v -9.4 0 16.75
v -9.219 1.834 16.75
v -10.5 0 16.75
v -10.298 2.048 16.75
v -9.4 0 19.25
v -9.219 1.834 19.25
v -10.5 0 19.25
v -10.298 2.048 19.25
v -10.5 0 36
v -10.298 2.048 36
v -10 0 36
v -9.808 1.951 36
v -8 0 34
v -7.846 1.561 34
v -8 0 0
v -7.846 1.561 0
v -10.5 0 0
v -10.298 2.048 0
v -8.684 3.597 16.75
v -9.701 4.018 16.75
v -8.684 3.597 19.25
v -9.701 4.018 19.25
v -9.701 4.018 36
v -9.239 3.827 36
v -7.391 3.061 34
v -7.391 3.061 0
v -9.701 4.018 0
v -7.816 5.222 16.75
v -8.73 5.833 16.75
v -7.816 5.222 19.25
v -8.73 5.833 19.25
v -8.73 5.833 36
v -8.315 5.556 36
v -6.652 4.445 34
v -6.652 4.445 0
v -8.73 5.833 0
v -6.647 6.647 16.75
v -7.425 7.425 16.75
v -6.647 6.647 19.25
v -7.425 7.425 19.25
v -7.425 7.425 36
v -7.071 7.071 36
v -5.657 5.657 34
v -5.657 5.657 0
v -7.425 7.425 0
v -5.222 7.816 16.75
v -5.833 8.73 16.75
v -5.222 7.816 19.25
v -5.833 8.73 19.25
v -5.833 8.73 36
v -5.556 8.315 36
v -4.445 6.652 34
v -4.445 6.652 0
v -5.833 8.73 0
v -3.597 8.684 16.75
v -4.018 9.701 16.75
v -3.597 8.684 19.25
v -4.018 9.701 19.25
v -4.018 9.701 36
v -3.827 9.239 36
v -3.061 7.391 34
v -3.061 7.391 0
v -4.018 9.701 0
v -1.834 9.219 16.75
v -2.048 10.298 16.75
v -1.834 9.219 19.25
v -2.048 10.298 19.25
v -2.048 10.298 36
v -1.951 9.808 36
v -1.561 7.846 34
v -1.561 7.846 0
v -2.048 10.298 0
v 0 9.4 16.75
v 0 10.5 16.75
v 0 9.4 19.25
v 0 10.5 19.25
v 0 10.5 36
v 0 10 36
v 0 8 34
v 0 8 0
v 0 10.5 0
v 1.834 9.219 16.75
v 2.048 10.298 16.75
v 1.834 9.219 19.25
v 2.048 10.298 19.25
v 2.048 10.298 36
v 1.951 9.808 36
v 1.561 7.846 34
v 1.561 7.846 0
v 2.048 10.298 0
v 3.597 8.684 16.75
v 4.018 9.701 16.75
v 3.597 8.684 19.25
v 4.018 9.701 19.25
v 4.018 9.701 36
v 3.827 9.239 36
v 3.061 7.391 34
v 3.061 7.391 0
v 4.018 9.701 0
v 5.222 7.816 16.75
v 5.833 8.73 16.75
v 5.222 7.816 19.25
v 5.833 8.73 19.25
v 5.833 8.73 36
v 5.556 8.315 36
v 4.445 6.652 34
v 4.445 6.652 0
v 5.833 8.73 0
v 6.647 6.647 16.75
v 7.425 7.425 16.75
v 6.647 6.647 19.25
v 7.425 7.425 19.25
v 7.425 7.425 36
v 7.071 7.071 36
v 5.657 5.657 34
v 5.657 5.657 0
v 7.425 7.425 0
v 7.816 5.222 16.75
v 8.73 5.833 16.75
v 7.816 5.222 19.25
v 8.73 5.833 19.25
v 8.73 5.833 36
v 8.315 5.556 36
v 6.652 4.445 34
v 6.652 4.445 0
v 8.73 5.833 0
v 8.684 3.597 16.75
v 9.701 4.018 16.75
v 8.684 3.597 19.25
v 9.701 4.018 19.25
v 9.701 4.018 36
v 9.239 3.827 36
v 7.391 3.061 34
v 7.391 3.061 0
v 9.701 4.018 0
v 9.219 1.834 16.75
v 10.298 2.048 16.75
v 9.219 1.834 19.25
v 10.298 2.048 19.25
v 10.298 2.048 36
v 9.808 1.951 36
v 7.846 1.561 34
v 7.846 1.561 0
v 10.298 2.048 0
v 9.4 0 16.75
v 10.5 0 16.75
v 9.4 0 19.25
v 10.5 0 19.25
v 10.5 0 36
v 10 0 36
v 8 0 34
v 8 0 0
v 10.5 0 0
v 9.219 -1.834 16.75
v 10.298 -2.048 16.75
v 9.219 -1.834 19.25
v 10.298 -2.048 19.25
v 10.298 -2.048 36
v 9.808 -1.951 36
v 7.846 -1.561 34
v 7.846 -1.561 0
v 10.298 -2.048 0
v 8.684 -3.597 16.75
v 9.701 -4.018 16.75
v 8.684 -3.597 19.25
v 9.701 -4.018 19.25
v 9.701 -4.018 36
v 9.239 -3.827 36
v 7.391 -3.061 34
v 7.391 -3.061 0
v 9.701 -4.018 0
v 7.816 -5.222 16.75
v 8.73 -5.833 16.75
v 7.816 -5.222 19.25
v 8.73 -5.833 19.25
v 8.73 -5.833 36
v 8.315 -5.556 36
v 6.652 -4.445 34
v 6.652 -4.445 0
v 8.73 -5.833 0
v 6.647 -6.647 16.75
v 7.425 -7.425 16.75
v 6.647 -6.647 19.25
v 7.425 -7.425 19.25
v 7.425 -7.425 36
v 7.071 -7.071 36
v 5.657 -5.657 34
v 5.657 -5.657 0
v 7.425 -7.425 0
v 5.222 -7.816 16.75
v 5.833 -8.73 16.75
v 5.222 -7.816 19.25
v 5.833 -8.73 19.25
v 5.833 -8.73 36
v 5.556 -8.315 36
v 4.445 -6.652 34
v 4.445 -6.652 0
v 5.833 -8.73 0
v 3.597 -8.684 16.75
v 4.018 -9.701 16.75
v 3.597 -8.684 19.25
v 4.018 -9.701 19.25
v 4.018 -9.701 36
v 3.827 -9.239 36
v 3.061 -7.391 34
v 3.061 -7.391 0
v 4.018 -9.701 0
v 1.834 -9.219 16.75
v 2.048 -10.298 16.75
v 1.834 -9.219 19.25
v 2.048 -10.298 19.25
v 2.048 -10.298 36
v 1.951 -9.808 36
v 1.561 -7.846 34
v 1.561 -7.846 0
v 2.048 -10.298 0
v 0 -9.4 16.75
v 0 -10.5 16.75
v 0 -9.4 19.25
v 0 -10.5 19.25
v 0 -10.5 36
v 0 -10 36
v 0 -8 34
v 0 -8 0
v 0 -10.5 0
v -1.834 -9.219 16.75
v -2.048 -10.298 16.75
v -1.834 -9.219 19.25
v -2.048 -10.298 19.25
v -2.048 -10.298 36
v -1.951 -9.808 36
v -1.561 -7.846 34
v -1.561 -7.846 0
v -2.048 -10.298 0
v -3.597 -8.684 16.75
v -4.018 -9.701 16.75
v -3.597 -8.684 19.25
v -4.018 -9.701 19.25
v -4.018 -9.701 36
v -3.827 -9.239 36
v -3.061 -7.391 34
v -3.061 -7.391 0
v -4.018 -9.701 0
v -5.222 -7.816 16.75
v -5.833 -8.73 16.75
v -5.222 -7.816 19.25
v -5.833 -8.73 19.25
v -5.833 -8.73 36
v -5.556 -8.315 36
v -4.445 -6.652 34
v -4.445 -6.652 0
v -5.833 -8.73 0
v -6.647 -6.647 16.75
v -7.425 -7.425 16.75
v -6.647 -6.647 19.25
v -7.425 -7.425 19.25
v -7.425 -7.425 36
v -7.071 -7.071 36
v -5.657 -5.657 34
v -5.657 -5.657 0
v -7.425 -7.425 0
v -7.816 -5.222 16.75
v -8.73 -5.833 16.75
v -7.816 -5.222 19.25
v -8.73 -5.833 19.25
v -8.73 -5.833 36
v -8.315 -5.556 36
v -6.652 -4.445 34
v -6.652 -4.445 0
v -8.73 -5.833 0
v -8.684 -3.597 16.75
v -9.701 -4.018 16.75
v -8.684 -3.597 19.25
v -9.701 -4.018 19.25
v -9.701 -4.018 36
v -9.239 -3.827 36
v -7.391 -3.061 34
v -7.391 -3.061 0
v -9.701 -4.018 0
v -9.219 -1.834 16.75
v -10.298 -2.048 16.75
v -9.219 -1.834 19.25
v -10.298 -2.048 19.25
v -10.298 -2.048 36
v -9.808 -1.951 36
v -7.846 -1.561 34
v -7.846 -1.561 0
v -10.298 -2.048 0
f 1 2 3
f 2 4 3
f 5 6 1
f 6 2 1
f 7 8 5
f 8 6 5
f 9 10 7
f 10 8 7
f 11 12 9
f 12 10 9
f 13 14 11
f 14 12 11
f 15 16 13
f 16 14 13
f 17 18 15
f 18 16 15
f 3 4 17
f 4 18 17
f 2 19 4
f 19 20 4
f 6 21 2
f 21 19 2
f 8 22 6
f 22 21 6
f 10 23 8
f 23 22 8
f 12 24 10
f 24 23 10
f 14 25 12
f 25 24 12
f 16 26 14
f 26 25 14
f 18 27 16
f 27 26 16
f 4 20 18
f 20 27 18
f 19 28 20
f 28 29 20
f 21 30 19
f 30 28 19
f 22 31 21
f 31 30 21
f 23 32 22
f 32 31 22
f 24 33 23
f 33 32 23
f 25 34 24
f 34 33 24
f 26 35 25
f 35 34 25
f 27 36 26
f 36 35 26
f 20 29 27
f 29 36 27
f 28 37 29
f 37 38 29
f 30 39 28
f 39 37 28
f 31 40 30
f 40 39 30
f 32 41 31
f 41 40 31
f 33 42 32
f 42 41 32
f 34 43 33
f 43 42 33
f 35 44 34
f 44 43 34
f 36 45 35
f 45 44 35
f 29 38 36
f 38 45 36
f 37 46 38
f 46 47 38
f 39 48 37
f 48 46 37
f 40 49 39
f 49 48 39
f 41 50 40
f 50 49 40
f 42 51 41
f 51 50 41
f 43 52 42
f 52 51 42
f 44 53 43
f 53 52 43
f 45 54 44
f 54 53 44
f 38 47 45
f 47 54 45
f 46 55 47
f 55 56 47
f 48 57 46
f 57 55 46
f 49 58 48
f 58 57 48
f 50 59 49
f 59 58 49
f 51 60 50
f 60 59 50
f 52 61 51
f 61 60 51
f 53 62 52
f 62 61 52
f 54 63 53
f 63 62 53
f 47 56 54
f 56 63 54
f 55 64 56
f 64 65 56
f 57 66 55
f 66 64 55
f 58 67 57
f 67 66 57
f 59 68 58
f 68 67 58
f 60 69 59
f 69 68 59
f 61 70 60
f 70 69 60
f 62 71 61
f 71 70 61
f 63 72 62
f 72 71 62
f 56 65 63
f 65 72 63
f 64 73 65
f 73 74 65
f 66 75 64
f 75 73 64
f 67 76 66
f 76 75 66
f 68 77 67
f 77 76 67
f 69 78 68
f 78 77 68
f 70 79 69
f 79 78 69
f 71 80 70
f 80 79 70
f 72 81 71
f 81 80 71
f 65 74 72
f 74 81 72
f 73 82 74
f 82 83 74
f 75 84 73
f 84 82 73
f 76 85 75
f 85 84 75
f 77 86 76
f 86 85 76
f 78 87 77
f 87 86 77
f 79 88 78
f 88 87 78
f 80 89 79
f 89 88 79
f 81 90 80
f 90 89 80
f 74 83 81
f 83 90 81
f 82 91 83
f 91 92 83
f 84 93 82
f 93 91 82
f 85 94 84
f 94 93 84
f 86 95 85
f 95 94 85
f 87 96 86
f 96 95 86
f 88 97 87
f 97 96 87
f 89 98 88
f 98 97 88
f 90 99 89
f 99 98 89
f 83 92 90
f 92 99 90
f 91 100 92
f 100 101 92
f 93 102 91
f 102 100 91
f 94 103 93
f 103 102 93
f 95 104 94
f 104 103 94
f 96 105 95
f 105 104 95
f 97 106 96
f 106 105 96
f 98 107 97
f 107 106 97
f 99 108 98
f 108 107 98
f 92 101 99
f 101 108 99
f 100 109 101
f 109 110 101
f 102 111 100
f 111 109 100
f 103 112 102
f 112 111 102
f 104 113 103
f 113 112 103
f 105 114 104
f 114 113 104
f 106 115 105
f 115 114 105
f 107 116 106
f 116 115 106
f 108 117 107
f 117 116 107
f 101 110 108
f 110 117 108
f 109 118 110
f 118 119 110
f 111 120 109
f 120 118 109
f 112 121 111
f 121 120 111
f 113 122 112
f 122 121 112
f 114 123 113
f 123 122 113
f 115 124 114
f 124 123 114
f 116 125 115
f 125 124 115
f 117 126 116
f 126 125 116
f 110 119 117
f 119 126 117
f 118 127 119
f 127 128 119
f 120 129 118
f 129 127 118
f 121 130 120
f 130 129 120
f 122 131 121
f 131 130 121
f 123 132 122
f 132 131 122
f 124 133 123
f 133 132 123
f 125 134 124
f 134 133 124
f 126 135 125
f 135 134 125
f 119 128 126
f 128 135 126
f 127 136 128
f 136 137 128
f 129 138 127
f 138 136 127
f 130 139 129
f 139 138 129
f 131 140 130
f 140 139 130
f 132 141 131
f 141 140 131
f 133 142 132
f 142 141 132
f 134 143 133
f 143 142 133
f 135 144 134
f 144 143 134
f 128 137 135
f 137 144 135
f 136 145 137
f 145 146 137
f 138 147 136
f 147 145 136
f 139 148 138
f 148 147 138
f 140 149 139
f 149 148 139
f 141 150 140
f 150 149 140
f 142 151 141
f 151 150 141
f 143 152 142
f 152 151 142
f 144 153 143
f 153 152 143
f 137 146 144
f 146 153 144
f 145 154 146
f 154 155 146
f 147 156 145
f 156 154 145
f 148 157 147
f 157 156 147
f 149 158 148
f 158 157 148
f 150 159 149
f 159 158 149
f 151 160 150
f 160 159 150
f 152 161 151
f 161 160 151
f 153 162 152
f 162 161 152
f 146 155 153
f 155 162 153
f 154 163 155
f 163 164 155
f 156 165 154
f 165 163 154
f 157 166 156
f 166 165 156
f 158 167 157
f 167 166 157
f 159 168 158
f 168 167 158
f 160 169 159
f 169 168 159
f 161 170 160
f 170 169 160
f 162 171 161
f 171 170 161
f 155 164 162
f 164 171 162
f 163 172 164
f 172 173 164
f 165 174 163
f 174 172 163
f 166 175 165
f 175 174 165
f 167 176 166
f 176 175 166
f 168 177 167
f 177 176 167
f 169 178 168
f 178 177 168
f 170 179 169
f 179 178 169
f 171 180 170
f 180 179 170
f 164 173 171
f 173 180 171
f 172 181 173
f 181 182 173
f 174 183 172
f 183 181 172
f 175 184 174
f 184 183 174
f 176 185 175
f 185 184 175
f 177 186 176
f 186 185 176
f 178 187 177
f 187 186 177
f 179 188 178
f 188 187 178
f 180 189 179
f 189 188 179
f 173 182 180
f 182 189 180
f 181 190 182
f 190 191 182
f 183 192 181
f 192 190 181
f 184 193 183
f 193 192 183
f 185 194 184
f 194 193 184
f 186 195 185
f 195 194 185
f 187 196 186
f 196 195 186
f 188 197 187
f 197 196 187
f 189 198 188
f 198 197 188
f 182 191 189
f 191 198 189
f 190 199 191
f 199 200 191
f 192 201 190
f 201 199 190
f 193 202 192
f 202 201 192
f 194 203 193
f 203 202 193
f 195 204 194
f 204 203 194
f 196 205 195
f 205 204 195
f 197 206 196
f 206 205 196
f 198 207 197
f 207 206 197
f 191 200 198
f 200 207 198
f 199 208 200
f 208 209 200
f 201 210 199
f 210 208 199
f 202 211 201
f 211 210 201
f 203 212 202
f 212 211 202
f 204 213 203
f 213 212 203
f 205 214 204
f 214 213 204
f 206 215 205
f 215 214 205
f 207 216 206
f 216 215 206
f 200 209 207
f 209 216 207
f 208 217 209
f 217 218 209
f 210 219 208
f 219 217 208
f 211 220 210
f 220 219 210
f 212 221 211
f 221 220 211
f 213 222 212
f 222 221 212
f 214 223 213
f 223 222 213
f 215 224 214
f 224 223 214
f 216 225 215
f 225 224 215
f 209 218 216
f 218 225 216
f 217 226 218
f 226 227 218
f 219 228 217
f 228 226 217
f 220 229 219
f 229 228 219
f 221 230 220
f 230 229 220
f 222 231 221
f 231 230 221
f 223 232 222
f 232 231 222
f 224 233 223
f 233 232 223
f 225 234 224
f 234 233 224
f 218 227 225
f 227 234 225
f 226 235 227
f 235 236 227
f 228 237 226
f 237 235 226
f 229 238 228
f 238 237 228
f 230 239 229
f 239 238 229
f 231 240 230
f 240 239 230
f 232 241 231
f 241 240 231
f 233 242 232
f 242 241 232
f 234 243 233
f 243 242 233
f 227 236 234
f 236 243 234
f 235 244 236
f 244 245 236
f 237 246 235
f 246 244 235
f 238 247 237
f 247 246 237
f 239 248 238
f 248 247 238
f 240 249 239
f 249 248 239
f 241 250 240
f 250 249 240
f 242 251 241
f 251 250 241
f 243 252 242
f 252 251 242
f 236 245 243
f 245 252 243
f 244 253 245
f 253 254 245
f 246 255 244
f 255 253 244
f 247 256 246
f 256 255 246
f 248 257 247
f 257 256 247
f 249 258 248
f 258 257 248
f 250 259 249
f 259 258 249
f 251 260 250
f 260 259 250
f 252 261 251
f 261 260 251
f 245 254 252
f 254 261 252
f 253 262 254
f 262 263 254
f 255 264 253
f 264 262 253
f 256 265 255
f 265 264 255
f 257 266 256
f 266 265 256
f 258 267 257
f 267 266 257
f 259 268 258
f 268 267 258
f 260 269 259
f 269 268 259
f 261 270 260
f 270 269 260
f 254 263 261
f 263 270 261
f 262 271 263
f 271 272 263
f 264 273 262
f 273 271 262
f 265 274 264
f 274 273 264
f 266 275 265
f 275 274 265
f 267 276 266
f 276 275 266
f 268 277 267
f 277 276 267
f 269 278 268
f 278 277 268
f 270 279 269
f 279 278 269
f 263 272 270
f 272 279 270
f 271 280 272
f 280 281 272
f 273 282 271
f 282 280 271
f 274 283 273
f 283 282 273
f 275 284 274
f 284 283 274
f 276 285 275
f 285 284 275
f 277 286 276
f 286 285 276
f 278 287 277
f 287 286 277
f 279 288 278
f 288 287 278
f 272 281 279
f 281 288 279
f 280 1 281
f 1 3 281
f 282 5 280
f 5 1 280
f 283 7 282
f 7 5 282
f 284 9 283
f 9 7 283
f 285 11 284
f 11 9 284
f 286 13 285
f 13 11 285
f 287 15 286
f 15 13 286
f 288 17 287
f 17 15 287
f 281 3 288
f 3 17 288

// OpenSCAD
$fn = 32;

// ----------------------------------------------------------------------
// Grooved revolve: thread_relief, bore R8
// ----------------------------------------------------------------------

// --- parameters (mm) ---
bore_r = 8;               // bore radius
outer_r = 10.5;           // outer radius of the body
total_h = 36;             // overall height, Z
wall = 2.5;               // radial wall thickness
groove_w = 2.5;           // groove width
groove_d = 1.1;           // groove depth
grooves = 1;              // number of outer grooves
relief = 2;               // thread relief leg at the bore mouth
relief_angle = 45;        // thread relief chamfer angle, degrees

bbox_x = 2 * outer_r;  // full diameter
bore_d = 2 * bore_r;  // bore diameter
body_d = 2 * outer_r;  // body diameter
revolve_angle = 360;  // full turn around the Z axis

profile = [[8, 0], [10.5, 0], [10.5, 16.75], [9.4, 16.75], [9.4, 19.25], [10.5, 19.25], [10.5, 36], [10, 36], [8, 34]];  // primary outline, 9 points, counter clockwise

// --- the one profile operation ---
rotate_extrude(angle = revolve_angle) polygon(points = profile);
